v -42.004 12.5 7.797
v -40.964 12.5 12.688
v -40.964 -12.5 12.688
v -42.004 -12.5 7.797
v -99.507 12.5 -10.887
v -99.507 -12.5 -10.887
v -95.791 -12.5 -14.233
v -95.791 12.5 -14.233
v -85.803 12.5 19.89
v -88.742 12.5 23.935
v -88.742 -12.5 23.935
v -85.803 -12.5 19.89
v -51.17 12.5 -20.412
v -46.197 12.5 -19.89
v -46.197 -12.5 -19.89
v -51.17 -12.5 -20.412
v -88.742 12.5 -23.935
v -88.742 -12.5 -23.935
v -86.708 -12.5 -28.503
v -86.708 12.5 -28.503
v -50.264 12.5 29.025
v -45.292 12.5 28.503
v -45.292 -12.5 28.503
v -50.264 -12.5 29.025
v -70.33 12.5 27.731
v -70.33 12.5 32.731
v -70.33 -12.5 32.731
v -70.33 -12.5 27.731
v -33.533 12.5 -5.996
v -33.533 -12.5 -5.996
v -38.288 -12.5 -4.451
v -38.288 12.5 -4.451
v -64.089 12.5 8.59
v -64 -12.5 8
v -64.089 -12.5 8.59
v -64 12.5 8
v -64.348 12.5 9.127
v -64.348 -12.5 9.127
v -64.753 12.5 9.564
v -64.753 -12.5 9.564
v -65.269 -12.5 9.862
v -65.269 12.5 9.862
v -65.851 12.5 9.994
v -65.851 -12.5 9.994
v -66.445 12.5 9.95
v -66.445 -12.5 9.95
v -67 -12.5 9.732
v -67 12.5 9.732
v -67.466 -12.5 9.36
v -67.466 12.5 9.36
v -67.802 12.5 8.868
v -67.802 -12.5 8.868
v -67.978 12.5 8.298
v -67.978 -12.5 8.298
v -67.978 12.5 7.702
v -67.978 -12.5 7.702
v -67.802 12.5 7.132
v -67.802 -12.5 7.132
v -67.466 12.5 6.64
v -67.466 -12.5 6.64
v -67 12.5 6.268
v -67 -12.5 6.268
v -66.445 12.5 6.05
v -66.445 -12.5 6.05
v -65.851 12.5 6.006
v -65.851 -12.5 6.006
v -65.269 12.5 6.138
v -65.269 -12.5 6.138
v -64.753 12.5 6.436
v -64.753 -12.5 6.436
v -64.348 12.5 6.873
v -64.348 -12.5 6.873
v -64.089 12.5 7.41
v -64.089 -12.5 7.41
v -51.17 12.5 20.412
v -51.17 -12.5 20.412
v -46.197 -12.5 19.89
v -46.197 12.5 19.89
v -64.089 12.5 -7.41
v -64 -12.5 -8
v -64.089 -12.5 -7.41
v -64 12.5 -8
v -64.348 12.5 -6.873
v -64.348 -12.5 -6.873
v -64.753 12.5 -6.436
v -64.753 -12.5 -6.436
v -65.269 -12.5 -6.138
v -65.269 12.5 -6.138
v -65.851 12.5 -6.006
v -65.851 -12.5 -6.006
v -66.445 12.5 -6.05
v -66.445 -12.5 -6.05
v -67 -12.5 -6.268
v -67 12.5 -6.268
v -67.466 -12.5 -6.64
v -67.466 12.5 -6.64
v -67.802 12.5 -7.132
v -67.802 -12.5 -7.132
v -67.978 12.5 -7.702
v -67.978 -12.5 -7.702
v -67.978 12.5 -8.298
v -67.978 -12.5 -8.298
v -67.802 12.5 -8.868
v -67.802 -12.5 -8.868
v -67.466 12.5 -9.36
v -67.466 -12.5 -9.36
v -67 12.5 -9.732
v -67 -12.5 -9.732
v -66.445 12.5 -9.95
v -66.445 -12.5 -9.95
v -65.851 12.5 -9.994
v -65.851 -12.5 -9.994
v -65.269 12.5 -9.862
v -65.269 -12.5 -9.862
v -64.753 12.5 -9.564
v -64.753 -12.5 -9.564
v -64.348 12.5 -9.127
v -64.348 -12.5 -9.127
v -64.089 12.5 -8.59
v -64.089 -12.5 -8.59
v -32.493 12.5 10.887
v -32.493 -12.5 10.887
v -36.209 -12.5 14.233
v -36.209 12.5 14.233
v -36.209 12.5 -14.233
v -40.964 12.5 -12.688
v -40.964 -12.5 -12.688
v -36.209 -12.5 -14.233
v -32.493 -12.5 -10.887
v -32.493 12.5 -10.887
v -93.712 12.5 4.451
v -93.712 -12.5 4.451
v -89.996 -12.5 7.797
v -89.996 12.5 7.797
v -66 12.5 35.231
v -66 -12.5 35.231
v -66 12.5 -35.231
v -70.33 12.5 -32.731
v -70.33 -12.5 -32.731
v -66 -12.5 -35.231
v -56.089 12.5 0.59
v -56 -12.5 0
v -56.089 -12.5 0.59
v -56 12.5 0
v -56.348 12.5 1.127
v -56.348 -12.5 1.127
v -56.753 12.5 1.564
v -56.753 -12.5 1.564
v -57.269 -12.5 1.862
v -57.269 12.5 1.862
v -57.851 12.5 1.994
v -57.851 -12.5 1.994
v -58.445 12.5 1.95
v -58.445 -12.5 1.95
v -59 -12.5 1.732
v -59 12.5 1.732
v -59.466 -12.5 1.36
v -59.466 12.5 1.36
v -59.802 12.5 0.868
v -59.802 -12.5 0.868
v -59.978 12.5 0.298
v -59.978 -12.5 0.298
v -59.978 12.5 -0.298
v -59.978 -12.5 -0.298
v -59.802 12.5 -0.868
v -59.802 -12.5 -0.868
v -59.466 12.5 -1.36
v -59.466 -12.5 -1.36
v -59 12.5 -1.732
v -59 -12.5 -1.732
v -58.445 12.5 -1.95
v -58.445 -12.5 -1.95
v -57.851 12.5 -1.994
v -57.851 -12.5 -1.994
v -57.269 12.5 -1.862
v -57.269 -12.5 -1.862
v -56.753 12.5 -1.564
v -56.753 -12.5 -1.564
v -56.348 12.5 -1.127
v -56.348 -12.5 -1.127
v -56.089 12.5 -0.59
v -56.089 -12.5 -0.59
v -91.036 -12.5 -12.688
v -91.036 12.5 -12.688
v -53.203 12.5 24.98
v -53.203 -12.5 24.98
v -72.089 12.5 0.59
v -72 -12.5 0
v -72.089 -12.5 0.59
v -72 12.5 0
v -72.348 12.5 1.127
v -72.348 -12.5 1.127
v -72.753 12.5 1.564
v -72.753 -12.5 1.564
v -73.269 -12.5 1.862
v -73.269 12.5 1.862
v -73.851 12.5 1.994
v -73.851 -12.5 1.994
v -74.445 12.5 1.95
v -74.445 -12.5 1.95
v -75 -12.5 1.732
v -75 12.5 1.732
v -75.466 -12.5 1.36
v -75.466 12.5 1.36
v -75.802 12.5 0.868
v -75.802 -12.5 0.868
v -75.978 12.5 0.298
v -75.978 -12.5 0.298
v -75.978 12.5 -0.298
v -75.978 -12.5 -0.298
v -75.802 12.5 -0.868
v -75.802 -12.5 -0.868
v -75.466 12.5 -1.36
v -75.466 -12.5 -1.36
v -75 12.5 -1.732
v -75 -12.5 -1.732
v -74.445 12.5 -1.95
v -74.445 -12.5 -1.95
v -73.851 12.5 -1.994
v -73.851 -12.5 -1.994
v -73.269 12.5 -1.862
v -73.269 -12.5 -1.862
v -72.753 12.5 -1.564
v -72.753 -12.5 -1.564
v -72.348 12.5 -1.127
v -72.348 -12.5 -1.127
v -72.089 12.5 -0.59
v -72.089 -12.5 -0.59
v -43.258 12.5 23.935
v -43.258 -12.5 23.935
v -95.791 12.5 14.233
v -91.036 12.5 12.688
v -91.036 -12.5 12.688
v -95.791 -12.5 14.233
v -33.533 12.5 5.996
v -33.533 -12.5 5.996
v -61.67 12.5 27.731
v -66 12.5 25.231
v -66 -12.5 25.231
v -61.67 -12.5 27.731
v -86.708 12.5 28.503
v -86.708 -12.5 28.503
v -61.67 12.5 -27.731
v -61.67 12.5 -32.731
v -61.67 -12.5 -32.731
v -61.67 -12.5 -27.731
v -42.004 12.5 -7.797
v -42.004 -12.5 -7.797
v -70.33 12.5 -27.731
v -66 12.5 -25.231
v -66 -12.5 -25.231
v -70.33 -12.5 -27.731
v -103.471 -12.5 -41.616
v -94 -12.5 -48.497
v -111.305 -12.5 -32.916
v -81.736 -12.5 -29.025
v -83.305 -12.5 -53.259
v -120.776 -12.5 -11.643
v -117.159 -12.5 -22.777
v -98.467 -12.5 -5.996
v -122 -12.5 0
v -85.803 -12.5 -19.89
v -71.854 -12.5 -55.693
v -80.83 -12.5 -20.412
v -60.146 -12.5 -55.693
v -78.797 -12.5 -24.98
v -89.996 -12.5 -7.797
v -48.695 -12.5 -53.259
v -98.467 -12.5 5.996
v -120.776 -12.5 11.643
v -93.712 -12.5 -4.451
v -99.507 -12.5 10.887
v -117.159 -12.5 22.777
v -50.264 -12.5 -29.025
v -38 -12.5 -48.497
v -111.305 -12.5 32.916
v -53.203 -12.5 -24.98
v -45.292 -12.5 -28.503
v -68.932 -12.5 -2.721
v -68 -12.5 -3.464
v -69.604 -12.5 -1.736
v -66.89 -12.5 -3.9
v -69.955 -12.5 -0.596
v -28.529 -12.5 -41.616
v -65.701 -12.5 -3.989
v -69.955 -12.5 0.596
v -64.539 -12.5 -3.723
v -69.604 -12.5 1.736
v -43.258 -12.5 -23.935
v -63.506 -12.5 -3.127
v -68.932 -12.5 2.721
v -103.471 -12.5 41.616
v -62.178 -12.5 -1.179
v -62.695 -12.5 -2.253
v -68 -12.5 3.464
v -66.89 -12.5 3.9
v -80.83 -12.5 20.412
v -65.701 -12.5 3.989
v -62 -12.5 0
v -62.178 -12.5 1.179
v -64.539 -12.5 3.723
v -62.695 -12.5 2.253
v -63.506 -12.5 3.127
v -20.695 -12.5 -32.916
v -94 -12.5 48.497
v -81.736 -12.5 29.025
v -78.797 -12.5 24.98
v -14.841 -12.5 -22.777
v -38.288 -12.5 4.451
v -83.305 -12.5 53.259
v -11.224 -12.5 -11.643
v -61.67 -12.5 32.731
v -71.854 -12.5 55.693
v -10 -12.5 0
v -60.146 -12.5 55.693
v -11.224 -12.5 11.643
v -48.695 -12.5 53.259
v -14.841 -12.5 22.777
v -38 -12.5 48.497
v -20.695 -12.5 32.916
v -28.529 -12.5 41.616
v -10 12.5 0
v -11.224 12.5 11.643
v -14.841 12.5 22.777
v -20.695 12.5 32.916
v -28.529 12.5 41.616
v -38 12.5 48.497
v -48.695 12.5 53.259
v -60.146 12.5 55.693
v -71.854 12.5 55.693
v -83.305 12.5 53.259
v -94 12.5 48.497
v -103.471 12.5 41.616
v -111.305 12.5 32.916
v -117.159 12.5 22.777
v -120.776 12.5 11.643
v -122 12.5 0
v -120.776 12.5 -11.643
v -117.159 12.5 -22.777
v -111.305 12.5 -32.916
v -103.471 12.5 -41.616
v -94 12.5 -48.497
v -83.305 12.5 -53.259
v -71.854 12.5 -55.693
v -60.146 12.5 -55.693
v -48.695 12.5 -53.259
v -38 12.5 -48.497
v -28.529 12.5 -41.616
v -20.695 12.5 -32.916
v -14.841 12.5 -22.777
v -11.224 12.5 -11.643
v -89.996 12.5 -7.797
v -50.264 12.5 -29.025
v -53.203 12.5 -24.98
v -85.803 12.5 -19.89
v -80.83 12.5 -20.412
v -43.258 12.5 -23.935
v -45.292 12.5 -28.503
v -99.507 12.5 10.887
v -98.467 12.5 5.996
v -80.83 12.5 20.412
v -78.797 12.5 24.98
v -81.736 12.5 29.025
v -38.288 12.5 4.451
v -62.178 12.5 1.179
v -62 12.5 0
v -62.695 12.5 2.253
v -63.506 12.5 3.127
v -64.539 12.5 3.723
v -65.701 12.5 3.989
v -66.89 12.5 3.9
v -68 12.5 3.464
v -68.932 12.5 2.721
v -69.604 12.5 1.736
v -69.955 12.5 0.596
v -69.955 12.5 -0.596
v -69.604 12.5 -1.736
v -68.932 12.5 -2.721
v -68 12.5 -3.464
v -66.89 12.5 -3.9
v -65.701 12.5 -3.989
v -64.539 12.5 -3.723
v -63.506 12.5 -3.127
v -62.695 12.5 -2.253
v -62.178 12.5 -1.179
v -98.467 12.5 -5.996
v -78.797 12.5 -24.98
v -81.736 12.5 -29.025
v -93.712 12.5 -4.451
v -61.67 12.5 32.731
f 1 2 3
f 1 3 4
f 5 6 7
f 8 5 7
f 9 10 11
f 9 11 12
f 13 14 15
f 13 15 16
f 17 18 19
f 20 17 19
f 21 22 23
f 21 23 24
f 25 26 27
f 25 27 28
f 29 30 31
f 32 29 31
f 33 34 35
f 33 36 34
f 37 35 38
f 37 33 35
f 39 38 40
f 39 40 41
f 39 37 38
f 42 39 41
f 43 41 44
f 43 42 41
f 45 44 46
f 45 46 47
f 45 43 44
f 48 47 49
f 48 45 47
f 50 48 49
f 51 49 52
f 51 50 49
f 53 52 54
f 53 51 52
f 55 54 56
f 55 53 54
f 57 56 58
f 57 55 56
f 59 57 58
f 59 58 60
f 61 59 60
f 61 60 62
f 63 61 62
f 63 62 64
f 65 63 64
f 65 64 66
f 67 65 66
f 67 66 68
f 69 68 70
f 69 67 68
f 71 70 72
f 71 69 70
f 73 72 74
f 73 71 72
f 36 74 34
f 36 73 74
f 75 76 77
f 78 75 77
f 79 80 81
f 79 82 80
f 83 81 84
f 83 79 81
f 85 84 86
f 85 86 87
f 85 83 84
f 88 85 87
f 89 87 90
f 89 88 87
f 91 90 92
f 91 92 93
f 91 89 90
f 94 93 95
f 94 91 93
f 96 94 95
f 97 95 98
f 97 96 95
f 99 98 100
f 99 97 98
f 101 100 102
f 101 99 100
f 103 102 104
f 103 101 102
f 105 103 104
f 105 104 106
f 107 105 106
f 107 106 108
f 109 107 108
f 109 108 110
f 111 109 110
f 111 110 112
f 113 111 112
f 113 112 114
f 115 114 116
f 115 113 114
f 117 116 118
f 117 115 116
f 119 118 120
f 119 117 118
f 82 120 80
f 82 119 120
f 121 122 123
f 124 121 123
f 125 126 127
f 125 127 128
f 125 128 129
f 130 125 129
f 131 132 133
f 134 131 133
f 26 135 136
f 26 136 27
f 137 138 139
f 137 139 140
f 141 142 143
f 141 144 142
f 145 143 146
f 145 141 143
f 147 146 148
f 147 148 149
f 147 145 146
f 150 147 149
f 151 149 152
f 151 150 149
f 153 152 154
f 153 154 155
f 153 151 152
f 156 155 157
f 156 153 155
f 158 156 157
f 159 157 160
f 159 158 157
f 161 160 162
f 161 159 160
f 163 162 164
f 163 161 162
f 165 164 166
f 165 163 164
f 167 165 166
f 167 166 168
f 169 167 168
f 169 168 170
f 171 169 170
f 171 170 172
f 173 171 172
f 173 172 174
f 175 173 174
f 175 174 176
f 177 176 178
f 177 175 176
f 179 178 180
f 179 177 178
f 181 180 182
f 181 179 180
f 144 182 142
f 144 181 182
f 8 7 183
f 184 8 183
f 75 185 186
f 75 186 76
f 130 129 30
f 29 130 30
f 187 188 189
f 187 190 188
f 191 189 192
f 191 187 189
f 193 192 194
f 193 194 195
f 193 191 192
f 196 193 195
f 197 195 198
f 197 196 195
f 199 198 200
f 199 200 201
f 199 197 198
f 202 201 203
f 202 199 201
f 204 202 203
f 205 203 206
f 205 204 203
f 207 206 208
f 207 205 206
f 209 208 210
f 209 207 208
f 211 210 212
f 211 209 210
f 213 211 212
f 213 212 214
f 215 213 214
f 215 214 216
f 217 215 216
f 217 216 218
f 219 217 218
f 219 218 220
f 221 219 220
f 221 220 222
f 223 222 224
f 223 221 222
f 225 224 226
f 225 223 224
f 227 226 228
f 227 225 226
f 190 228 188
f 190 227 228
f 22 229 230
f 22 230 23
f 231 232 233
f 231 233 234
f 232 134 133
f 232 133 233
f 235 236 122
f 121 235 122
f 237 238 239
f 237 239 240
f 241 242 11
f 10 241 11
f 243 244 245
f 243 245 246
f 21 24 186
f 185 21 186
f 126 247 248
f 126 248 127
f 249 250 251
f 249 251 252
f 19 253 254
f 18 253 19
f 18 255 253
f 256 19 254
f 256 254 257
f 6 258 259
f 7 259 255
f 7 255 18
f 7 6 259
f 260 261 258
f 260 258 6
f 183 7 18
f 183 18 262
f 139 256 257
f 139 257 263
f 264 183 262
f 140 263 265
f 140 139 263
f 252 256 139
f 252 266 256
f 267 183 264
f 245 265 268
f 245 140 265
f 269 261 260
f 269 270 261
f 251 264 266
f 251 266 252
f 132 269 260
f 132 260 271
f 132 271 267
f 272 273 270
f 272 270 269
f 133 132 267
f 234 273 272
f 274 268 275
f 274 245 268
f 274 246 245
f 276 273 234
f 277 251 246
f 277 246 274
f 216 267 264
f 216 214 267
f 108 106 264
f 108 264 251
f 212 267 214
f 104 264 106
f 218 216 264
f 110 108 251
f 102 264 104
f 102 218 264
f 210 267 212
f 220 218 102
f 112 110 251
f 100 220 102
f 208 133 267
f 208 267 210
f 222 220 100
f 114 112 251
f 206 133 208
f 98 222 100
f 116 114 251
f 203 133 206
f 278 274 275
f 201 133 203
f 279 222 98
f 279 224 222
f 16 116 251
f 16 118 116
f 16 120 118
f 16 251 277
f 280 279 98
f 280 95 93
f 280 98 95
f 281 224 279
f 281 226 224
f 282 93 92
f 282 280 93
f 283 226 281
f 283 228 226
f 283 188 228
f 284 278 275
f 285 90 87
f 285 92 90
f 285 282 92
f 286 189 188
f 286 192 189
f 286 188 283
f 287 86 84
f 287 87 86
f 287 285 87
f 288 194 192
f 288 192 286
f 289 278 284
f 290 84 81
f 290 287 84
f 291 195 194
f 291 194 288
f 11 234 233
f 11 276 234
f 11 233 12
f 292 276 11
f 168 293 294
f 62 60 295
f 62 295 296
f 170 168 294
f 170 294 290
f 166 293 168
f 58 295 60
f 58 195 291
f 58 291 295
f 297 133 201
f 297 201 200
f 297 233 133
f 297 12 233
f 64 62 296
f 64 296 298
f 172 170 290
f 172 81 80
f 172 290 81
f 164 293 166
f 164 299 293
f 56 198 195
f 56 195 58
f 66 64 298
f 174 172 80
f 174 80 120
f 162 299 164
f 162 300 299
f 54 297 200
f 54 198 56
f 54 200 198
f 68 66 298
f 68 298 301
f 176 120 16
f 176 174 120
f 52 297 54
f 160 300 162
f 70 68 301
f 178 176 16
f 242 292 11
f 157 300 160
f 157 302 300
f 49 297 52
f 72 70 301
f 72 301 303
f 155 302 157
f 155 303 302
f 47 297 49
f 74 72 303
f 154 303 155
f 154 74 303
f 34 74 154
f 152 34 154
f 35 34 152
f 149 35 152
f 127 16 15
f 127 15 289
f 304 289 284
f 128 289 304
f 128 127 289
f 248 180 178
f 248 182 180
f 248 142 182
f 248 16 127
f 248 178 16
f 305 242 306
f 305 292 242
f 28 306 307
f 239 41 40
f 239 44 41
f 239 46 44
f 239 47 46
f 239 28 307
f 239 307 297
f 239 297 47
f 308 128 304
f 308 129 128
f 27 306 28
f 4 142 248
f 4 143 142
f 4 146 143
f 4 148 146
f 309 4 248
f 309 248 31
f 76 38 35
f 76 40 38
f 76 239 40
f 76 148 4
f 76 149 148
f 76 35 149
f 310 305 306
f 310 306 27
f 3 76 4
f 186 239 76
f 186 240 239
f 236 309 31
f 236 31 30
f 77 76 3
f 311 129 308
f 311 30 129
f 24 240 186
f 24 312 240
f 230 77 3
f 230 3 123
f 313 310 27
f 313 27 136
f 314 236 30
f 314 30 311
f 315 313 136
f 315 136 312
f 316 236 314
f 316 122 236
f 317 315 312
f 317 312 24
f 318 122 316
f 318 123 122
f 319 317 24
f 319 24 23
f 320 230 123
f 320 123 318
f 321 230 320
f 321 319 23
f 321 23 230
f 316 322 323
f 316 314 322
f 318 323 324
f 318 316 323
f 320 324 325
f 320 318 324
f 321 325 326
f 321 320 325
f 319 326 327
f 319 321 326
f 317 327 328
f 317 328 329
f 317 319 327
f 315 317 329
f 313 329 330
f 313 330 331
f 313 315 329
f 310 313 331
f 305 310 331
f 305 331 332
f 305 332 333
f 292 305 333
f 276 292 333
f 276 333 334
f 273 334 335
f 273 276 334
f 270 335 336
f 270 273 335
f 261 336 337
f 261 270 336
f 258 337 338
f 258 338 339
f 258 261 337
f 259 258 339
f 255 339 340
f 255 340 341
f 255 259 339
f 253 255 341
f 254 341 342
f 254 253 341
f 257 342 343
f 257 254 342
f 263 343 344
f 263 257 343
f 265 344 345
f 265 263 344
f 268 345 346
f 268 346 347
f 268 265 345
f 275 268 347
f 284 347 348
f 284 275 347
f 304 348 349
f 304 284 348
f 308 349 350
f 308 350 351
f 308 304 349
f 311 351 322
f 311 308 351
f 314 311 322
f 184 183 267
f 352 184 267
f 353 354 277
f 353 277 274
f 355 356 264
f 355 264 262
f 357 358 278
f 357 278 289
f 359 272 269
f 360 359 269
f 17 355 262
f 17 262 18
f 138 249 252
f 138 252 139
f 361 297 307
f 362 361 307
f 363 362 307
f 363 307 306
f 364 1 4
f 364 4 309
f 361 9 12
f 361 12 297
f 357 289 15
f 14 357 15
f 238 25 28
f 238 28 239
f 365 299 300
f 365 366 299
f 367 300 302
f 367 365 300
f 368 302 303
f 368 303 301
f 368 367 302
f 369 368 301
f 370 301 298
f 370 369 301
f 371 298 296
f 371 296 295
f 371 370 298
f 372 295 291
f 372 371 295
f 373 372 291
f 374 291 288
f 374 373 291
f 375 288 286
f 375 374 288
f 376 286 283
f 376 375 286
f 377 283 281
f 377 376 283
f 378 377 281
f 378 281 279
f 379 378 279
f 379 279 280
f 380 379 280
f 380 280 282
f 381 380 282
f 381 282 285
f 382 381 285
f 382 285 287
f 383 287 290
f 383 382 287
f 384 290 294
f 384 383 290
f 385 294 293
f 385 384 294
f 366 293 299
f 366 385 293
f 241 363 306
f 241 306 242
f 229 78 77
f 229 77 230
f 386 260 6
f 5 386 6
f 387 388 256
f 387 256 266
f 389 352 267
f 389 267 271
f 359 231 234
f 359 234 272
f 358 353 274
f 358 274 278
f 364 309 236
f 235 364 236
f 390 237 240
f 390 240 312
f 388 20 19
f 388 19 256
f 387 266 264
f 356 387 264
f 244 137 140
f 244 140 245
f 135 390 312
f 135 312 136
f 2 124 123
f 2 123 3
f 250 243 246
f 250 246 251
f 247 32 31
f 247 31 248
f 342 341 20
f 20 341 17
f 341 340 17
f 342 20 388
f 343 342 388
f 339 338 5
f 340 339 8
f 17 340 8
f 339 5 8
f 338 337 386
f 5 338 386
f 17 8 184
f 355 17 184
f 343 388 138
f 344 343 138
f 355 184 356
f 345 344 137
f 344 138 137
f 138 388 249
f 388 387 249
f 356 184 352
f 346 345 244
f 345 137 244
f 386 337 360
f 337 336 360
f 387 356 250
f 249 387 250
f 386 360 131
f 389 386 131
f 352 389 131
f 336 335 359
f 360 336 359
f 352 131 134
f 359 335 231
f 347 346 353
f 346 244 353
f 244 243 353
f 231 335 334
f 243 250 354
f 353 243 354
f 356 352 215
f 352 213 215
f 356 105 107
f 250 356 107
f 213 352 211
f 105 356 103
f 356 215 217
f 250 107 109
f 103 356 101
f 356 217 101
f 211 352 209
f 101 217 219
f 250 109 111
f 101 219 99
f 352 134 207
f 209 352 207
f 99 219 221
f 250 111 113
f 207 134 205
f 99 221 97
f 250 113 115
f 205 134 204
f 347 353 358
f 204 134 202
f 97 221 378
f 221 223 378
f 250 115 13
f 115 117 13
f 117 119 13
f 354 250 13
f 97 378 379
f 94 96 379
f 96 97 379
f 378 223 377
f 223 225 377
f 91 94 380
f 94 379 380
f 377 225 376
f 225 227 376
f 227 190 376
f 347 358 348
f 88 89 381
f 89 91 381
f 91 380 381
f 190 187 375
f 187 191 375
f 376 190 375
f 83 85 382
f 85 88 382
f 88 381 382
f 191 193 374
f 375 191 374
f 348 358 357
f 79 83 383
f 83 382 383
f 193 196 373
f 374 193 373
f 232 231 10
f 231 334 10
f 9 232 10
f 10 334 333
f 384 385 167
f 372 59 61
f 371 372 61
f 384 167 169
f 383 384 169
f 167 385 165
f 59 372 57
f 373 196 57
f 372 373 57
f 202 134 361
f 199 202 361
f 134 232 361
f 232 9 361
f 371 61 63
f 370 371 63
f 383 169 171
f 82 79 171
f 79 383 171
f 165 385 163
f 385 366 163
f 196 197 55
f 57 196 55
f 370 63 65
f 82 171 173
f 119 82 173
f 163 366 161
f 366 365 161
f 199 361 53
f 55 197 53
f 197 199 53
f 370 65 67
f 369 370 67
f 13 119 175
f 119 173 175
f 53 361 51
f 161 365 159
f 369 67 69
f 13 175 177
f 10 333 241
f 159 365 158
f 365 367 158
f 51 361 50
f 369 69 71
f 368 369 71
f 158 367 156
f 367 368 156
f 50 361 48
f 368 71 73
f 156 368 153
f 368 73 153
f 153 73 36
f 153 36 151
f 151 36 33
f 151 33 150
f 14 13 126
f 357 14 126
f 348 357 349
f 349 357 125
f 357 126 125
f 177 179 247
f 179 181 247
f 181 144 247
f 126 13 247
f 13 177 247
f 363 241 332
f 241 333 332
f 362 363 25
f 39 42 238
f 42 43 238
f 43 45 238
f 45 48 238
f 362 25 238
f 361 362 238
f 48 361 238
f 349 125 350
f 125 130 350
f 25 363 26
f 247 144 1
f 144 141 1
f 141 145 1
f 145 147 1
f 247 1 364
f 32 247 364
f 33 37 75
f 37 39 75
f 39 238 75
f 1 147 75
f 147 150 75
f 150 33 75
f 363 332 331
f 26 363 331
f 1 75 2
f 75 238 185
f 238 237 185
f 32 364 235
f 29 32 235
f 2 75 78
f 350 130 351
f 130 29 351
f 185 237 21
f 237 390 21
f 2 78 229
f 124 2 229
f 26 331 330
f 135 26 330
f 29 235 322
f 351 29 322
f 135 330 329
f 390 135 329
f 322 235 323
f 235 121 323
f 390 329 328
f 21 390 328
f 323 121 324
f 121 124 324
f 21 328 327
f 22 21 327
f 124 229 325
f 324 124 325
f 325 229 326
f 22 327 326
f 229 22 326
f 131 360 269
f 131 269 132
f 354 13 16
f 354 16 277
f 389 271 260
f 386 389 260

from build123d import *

# Parameters (mm, degrees)
F0_R     = 56
F0_R_2   = 21
F2_DEPTH = 12.5
F3_DEPTH = 25
F0_R_3   = 16
F0_R_4   = 2
F0_R_5   = 4
F4_DEPTH = 12.5


with BuildPart() as f2:
    # F0 (on Front) → F2 (new body, symmetric)
    with BuildSketch(Plane.XZ):
        with Locations((-66, 0)):
            Circle(F0_R)
        with Locations((-66, 0)):
            Circle(F0_R_2, mode=Mode.SUBTRACT)
    extrude(amount=F2_DEPTH, both=True)

    # F1 (on Front) → F3 (cut, symmetric)
    with BuildSketch(Plane.XZ):
        Polygon((-91.035729, 12.687567), (-95.791012, 14.232651), (-99.506736, 10.886998), (-98.467177, 5.99626), (-93.711895, 4.451175), (-89.996171, 7.796829), align=None)
        Polygon((-78.796766, 24.980089), (-81.735692, 29.025174), (-86.708302, 28.502532), (-88.741985, 23.934805), (-85.803059, 19.88972), (-80.830449, 20.412362), align=None)
        Polygon((-66, 25.231067), (-61.669873, 27.731067), (-61.669873, 32.731067), (-66, 35.231067), (-70.330127, 32.731067), (-70.330127, 27.731067), align=None)
        Polygon((-46.196941, 19.88972), (-43.258015, 23.934805), (-45.291698, 28.502532), (-50.264308, 29.025174), (-53.203234, 24.980089), (-51.169551, 20.412362), align=None)
        Polygon((-38.288105, 4.451175), (-33.532823, 5.99626), (-32.493264, 10.886998), (-36.208988, 14.232651), (-40.964271, 12.687567), (-42.003829, 7.796829), align=None)
        Polygon((-40.964271, -12.687567), (-36.208988, -14.232651), (-32.493264, -10.886998), (-33.532823, -5.99626), (-38.288105, -4.451175), (-42.003829, -7.796829), align=None)
        Polygon((-53.203234, -24.980089), (-50.264308, -29.025174), (-45.291698, -28.502532), (-43.258015, -23.934805), (-46.196941, -19.88972), (-51.169551, -20.412362), align=None)
        Polygon((-70.330127, -27.731067), (-70.330127, -32.731067), (-66, -35.231067), (-61.669873, -32.731067), (-61.669873, -27.731067), (-66, -25.231067), align=None)
        Polygon((-85.803059, -19.88972), (-88.741985, -23.934805), (-86.708302, -28.502532), (-81.735692, -29.025174), (-78.796766, -24.980089), (-80.830449, -20.412362), align=None)
        Polygon((-93.711895, -4.451175), (-98.467177, -5.99626), (-99.506736, -10.886998), (-95.791012, -14.232651), (-91.035729, -12.687567), (-89.996171, -7.796829), align=None)
    extrude(amount=F3_DEPTH, both=True, mode=Mode.SUBTRACT)

    # F0 (on Front) → F4 (join, symmetric)
    with BuildSketch(Plane.XZ):
        with Locations((-66, 0)):
            Circle(F0_R_2)
        with Locations((-66, 0)):
            Circle(F0_R_3, mode=Mode.SUBTRACT)
        with Locations((-66, 0)):
            Circle(F0_R_3)
        with Locations((-66, -8)):
            Circle(F0_R_4, mode=Mode.SUBTRACT)
        with Locations((-74, 0)):
            Circle(F0_R_4, mode=Mode.SUBTRACT)
        with Locations((-66, 0)):
            Circle(F0_R_5, mode=Mode.SUBTRACT)
        with Locations((-66, 8)):
            Circle(F0_R_4, mode=Mode.SUBTRACT)
        with Locations((-58, 0)):
            Circle(F0_R_4, mode=Mode.SUBTRACT)
    extrude(amount=F4_DEPTH, both=True)


solid = f2.part
